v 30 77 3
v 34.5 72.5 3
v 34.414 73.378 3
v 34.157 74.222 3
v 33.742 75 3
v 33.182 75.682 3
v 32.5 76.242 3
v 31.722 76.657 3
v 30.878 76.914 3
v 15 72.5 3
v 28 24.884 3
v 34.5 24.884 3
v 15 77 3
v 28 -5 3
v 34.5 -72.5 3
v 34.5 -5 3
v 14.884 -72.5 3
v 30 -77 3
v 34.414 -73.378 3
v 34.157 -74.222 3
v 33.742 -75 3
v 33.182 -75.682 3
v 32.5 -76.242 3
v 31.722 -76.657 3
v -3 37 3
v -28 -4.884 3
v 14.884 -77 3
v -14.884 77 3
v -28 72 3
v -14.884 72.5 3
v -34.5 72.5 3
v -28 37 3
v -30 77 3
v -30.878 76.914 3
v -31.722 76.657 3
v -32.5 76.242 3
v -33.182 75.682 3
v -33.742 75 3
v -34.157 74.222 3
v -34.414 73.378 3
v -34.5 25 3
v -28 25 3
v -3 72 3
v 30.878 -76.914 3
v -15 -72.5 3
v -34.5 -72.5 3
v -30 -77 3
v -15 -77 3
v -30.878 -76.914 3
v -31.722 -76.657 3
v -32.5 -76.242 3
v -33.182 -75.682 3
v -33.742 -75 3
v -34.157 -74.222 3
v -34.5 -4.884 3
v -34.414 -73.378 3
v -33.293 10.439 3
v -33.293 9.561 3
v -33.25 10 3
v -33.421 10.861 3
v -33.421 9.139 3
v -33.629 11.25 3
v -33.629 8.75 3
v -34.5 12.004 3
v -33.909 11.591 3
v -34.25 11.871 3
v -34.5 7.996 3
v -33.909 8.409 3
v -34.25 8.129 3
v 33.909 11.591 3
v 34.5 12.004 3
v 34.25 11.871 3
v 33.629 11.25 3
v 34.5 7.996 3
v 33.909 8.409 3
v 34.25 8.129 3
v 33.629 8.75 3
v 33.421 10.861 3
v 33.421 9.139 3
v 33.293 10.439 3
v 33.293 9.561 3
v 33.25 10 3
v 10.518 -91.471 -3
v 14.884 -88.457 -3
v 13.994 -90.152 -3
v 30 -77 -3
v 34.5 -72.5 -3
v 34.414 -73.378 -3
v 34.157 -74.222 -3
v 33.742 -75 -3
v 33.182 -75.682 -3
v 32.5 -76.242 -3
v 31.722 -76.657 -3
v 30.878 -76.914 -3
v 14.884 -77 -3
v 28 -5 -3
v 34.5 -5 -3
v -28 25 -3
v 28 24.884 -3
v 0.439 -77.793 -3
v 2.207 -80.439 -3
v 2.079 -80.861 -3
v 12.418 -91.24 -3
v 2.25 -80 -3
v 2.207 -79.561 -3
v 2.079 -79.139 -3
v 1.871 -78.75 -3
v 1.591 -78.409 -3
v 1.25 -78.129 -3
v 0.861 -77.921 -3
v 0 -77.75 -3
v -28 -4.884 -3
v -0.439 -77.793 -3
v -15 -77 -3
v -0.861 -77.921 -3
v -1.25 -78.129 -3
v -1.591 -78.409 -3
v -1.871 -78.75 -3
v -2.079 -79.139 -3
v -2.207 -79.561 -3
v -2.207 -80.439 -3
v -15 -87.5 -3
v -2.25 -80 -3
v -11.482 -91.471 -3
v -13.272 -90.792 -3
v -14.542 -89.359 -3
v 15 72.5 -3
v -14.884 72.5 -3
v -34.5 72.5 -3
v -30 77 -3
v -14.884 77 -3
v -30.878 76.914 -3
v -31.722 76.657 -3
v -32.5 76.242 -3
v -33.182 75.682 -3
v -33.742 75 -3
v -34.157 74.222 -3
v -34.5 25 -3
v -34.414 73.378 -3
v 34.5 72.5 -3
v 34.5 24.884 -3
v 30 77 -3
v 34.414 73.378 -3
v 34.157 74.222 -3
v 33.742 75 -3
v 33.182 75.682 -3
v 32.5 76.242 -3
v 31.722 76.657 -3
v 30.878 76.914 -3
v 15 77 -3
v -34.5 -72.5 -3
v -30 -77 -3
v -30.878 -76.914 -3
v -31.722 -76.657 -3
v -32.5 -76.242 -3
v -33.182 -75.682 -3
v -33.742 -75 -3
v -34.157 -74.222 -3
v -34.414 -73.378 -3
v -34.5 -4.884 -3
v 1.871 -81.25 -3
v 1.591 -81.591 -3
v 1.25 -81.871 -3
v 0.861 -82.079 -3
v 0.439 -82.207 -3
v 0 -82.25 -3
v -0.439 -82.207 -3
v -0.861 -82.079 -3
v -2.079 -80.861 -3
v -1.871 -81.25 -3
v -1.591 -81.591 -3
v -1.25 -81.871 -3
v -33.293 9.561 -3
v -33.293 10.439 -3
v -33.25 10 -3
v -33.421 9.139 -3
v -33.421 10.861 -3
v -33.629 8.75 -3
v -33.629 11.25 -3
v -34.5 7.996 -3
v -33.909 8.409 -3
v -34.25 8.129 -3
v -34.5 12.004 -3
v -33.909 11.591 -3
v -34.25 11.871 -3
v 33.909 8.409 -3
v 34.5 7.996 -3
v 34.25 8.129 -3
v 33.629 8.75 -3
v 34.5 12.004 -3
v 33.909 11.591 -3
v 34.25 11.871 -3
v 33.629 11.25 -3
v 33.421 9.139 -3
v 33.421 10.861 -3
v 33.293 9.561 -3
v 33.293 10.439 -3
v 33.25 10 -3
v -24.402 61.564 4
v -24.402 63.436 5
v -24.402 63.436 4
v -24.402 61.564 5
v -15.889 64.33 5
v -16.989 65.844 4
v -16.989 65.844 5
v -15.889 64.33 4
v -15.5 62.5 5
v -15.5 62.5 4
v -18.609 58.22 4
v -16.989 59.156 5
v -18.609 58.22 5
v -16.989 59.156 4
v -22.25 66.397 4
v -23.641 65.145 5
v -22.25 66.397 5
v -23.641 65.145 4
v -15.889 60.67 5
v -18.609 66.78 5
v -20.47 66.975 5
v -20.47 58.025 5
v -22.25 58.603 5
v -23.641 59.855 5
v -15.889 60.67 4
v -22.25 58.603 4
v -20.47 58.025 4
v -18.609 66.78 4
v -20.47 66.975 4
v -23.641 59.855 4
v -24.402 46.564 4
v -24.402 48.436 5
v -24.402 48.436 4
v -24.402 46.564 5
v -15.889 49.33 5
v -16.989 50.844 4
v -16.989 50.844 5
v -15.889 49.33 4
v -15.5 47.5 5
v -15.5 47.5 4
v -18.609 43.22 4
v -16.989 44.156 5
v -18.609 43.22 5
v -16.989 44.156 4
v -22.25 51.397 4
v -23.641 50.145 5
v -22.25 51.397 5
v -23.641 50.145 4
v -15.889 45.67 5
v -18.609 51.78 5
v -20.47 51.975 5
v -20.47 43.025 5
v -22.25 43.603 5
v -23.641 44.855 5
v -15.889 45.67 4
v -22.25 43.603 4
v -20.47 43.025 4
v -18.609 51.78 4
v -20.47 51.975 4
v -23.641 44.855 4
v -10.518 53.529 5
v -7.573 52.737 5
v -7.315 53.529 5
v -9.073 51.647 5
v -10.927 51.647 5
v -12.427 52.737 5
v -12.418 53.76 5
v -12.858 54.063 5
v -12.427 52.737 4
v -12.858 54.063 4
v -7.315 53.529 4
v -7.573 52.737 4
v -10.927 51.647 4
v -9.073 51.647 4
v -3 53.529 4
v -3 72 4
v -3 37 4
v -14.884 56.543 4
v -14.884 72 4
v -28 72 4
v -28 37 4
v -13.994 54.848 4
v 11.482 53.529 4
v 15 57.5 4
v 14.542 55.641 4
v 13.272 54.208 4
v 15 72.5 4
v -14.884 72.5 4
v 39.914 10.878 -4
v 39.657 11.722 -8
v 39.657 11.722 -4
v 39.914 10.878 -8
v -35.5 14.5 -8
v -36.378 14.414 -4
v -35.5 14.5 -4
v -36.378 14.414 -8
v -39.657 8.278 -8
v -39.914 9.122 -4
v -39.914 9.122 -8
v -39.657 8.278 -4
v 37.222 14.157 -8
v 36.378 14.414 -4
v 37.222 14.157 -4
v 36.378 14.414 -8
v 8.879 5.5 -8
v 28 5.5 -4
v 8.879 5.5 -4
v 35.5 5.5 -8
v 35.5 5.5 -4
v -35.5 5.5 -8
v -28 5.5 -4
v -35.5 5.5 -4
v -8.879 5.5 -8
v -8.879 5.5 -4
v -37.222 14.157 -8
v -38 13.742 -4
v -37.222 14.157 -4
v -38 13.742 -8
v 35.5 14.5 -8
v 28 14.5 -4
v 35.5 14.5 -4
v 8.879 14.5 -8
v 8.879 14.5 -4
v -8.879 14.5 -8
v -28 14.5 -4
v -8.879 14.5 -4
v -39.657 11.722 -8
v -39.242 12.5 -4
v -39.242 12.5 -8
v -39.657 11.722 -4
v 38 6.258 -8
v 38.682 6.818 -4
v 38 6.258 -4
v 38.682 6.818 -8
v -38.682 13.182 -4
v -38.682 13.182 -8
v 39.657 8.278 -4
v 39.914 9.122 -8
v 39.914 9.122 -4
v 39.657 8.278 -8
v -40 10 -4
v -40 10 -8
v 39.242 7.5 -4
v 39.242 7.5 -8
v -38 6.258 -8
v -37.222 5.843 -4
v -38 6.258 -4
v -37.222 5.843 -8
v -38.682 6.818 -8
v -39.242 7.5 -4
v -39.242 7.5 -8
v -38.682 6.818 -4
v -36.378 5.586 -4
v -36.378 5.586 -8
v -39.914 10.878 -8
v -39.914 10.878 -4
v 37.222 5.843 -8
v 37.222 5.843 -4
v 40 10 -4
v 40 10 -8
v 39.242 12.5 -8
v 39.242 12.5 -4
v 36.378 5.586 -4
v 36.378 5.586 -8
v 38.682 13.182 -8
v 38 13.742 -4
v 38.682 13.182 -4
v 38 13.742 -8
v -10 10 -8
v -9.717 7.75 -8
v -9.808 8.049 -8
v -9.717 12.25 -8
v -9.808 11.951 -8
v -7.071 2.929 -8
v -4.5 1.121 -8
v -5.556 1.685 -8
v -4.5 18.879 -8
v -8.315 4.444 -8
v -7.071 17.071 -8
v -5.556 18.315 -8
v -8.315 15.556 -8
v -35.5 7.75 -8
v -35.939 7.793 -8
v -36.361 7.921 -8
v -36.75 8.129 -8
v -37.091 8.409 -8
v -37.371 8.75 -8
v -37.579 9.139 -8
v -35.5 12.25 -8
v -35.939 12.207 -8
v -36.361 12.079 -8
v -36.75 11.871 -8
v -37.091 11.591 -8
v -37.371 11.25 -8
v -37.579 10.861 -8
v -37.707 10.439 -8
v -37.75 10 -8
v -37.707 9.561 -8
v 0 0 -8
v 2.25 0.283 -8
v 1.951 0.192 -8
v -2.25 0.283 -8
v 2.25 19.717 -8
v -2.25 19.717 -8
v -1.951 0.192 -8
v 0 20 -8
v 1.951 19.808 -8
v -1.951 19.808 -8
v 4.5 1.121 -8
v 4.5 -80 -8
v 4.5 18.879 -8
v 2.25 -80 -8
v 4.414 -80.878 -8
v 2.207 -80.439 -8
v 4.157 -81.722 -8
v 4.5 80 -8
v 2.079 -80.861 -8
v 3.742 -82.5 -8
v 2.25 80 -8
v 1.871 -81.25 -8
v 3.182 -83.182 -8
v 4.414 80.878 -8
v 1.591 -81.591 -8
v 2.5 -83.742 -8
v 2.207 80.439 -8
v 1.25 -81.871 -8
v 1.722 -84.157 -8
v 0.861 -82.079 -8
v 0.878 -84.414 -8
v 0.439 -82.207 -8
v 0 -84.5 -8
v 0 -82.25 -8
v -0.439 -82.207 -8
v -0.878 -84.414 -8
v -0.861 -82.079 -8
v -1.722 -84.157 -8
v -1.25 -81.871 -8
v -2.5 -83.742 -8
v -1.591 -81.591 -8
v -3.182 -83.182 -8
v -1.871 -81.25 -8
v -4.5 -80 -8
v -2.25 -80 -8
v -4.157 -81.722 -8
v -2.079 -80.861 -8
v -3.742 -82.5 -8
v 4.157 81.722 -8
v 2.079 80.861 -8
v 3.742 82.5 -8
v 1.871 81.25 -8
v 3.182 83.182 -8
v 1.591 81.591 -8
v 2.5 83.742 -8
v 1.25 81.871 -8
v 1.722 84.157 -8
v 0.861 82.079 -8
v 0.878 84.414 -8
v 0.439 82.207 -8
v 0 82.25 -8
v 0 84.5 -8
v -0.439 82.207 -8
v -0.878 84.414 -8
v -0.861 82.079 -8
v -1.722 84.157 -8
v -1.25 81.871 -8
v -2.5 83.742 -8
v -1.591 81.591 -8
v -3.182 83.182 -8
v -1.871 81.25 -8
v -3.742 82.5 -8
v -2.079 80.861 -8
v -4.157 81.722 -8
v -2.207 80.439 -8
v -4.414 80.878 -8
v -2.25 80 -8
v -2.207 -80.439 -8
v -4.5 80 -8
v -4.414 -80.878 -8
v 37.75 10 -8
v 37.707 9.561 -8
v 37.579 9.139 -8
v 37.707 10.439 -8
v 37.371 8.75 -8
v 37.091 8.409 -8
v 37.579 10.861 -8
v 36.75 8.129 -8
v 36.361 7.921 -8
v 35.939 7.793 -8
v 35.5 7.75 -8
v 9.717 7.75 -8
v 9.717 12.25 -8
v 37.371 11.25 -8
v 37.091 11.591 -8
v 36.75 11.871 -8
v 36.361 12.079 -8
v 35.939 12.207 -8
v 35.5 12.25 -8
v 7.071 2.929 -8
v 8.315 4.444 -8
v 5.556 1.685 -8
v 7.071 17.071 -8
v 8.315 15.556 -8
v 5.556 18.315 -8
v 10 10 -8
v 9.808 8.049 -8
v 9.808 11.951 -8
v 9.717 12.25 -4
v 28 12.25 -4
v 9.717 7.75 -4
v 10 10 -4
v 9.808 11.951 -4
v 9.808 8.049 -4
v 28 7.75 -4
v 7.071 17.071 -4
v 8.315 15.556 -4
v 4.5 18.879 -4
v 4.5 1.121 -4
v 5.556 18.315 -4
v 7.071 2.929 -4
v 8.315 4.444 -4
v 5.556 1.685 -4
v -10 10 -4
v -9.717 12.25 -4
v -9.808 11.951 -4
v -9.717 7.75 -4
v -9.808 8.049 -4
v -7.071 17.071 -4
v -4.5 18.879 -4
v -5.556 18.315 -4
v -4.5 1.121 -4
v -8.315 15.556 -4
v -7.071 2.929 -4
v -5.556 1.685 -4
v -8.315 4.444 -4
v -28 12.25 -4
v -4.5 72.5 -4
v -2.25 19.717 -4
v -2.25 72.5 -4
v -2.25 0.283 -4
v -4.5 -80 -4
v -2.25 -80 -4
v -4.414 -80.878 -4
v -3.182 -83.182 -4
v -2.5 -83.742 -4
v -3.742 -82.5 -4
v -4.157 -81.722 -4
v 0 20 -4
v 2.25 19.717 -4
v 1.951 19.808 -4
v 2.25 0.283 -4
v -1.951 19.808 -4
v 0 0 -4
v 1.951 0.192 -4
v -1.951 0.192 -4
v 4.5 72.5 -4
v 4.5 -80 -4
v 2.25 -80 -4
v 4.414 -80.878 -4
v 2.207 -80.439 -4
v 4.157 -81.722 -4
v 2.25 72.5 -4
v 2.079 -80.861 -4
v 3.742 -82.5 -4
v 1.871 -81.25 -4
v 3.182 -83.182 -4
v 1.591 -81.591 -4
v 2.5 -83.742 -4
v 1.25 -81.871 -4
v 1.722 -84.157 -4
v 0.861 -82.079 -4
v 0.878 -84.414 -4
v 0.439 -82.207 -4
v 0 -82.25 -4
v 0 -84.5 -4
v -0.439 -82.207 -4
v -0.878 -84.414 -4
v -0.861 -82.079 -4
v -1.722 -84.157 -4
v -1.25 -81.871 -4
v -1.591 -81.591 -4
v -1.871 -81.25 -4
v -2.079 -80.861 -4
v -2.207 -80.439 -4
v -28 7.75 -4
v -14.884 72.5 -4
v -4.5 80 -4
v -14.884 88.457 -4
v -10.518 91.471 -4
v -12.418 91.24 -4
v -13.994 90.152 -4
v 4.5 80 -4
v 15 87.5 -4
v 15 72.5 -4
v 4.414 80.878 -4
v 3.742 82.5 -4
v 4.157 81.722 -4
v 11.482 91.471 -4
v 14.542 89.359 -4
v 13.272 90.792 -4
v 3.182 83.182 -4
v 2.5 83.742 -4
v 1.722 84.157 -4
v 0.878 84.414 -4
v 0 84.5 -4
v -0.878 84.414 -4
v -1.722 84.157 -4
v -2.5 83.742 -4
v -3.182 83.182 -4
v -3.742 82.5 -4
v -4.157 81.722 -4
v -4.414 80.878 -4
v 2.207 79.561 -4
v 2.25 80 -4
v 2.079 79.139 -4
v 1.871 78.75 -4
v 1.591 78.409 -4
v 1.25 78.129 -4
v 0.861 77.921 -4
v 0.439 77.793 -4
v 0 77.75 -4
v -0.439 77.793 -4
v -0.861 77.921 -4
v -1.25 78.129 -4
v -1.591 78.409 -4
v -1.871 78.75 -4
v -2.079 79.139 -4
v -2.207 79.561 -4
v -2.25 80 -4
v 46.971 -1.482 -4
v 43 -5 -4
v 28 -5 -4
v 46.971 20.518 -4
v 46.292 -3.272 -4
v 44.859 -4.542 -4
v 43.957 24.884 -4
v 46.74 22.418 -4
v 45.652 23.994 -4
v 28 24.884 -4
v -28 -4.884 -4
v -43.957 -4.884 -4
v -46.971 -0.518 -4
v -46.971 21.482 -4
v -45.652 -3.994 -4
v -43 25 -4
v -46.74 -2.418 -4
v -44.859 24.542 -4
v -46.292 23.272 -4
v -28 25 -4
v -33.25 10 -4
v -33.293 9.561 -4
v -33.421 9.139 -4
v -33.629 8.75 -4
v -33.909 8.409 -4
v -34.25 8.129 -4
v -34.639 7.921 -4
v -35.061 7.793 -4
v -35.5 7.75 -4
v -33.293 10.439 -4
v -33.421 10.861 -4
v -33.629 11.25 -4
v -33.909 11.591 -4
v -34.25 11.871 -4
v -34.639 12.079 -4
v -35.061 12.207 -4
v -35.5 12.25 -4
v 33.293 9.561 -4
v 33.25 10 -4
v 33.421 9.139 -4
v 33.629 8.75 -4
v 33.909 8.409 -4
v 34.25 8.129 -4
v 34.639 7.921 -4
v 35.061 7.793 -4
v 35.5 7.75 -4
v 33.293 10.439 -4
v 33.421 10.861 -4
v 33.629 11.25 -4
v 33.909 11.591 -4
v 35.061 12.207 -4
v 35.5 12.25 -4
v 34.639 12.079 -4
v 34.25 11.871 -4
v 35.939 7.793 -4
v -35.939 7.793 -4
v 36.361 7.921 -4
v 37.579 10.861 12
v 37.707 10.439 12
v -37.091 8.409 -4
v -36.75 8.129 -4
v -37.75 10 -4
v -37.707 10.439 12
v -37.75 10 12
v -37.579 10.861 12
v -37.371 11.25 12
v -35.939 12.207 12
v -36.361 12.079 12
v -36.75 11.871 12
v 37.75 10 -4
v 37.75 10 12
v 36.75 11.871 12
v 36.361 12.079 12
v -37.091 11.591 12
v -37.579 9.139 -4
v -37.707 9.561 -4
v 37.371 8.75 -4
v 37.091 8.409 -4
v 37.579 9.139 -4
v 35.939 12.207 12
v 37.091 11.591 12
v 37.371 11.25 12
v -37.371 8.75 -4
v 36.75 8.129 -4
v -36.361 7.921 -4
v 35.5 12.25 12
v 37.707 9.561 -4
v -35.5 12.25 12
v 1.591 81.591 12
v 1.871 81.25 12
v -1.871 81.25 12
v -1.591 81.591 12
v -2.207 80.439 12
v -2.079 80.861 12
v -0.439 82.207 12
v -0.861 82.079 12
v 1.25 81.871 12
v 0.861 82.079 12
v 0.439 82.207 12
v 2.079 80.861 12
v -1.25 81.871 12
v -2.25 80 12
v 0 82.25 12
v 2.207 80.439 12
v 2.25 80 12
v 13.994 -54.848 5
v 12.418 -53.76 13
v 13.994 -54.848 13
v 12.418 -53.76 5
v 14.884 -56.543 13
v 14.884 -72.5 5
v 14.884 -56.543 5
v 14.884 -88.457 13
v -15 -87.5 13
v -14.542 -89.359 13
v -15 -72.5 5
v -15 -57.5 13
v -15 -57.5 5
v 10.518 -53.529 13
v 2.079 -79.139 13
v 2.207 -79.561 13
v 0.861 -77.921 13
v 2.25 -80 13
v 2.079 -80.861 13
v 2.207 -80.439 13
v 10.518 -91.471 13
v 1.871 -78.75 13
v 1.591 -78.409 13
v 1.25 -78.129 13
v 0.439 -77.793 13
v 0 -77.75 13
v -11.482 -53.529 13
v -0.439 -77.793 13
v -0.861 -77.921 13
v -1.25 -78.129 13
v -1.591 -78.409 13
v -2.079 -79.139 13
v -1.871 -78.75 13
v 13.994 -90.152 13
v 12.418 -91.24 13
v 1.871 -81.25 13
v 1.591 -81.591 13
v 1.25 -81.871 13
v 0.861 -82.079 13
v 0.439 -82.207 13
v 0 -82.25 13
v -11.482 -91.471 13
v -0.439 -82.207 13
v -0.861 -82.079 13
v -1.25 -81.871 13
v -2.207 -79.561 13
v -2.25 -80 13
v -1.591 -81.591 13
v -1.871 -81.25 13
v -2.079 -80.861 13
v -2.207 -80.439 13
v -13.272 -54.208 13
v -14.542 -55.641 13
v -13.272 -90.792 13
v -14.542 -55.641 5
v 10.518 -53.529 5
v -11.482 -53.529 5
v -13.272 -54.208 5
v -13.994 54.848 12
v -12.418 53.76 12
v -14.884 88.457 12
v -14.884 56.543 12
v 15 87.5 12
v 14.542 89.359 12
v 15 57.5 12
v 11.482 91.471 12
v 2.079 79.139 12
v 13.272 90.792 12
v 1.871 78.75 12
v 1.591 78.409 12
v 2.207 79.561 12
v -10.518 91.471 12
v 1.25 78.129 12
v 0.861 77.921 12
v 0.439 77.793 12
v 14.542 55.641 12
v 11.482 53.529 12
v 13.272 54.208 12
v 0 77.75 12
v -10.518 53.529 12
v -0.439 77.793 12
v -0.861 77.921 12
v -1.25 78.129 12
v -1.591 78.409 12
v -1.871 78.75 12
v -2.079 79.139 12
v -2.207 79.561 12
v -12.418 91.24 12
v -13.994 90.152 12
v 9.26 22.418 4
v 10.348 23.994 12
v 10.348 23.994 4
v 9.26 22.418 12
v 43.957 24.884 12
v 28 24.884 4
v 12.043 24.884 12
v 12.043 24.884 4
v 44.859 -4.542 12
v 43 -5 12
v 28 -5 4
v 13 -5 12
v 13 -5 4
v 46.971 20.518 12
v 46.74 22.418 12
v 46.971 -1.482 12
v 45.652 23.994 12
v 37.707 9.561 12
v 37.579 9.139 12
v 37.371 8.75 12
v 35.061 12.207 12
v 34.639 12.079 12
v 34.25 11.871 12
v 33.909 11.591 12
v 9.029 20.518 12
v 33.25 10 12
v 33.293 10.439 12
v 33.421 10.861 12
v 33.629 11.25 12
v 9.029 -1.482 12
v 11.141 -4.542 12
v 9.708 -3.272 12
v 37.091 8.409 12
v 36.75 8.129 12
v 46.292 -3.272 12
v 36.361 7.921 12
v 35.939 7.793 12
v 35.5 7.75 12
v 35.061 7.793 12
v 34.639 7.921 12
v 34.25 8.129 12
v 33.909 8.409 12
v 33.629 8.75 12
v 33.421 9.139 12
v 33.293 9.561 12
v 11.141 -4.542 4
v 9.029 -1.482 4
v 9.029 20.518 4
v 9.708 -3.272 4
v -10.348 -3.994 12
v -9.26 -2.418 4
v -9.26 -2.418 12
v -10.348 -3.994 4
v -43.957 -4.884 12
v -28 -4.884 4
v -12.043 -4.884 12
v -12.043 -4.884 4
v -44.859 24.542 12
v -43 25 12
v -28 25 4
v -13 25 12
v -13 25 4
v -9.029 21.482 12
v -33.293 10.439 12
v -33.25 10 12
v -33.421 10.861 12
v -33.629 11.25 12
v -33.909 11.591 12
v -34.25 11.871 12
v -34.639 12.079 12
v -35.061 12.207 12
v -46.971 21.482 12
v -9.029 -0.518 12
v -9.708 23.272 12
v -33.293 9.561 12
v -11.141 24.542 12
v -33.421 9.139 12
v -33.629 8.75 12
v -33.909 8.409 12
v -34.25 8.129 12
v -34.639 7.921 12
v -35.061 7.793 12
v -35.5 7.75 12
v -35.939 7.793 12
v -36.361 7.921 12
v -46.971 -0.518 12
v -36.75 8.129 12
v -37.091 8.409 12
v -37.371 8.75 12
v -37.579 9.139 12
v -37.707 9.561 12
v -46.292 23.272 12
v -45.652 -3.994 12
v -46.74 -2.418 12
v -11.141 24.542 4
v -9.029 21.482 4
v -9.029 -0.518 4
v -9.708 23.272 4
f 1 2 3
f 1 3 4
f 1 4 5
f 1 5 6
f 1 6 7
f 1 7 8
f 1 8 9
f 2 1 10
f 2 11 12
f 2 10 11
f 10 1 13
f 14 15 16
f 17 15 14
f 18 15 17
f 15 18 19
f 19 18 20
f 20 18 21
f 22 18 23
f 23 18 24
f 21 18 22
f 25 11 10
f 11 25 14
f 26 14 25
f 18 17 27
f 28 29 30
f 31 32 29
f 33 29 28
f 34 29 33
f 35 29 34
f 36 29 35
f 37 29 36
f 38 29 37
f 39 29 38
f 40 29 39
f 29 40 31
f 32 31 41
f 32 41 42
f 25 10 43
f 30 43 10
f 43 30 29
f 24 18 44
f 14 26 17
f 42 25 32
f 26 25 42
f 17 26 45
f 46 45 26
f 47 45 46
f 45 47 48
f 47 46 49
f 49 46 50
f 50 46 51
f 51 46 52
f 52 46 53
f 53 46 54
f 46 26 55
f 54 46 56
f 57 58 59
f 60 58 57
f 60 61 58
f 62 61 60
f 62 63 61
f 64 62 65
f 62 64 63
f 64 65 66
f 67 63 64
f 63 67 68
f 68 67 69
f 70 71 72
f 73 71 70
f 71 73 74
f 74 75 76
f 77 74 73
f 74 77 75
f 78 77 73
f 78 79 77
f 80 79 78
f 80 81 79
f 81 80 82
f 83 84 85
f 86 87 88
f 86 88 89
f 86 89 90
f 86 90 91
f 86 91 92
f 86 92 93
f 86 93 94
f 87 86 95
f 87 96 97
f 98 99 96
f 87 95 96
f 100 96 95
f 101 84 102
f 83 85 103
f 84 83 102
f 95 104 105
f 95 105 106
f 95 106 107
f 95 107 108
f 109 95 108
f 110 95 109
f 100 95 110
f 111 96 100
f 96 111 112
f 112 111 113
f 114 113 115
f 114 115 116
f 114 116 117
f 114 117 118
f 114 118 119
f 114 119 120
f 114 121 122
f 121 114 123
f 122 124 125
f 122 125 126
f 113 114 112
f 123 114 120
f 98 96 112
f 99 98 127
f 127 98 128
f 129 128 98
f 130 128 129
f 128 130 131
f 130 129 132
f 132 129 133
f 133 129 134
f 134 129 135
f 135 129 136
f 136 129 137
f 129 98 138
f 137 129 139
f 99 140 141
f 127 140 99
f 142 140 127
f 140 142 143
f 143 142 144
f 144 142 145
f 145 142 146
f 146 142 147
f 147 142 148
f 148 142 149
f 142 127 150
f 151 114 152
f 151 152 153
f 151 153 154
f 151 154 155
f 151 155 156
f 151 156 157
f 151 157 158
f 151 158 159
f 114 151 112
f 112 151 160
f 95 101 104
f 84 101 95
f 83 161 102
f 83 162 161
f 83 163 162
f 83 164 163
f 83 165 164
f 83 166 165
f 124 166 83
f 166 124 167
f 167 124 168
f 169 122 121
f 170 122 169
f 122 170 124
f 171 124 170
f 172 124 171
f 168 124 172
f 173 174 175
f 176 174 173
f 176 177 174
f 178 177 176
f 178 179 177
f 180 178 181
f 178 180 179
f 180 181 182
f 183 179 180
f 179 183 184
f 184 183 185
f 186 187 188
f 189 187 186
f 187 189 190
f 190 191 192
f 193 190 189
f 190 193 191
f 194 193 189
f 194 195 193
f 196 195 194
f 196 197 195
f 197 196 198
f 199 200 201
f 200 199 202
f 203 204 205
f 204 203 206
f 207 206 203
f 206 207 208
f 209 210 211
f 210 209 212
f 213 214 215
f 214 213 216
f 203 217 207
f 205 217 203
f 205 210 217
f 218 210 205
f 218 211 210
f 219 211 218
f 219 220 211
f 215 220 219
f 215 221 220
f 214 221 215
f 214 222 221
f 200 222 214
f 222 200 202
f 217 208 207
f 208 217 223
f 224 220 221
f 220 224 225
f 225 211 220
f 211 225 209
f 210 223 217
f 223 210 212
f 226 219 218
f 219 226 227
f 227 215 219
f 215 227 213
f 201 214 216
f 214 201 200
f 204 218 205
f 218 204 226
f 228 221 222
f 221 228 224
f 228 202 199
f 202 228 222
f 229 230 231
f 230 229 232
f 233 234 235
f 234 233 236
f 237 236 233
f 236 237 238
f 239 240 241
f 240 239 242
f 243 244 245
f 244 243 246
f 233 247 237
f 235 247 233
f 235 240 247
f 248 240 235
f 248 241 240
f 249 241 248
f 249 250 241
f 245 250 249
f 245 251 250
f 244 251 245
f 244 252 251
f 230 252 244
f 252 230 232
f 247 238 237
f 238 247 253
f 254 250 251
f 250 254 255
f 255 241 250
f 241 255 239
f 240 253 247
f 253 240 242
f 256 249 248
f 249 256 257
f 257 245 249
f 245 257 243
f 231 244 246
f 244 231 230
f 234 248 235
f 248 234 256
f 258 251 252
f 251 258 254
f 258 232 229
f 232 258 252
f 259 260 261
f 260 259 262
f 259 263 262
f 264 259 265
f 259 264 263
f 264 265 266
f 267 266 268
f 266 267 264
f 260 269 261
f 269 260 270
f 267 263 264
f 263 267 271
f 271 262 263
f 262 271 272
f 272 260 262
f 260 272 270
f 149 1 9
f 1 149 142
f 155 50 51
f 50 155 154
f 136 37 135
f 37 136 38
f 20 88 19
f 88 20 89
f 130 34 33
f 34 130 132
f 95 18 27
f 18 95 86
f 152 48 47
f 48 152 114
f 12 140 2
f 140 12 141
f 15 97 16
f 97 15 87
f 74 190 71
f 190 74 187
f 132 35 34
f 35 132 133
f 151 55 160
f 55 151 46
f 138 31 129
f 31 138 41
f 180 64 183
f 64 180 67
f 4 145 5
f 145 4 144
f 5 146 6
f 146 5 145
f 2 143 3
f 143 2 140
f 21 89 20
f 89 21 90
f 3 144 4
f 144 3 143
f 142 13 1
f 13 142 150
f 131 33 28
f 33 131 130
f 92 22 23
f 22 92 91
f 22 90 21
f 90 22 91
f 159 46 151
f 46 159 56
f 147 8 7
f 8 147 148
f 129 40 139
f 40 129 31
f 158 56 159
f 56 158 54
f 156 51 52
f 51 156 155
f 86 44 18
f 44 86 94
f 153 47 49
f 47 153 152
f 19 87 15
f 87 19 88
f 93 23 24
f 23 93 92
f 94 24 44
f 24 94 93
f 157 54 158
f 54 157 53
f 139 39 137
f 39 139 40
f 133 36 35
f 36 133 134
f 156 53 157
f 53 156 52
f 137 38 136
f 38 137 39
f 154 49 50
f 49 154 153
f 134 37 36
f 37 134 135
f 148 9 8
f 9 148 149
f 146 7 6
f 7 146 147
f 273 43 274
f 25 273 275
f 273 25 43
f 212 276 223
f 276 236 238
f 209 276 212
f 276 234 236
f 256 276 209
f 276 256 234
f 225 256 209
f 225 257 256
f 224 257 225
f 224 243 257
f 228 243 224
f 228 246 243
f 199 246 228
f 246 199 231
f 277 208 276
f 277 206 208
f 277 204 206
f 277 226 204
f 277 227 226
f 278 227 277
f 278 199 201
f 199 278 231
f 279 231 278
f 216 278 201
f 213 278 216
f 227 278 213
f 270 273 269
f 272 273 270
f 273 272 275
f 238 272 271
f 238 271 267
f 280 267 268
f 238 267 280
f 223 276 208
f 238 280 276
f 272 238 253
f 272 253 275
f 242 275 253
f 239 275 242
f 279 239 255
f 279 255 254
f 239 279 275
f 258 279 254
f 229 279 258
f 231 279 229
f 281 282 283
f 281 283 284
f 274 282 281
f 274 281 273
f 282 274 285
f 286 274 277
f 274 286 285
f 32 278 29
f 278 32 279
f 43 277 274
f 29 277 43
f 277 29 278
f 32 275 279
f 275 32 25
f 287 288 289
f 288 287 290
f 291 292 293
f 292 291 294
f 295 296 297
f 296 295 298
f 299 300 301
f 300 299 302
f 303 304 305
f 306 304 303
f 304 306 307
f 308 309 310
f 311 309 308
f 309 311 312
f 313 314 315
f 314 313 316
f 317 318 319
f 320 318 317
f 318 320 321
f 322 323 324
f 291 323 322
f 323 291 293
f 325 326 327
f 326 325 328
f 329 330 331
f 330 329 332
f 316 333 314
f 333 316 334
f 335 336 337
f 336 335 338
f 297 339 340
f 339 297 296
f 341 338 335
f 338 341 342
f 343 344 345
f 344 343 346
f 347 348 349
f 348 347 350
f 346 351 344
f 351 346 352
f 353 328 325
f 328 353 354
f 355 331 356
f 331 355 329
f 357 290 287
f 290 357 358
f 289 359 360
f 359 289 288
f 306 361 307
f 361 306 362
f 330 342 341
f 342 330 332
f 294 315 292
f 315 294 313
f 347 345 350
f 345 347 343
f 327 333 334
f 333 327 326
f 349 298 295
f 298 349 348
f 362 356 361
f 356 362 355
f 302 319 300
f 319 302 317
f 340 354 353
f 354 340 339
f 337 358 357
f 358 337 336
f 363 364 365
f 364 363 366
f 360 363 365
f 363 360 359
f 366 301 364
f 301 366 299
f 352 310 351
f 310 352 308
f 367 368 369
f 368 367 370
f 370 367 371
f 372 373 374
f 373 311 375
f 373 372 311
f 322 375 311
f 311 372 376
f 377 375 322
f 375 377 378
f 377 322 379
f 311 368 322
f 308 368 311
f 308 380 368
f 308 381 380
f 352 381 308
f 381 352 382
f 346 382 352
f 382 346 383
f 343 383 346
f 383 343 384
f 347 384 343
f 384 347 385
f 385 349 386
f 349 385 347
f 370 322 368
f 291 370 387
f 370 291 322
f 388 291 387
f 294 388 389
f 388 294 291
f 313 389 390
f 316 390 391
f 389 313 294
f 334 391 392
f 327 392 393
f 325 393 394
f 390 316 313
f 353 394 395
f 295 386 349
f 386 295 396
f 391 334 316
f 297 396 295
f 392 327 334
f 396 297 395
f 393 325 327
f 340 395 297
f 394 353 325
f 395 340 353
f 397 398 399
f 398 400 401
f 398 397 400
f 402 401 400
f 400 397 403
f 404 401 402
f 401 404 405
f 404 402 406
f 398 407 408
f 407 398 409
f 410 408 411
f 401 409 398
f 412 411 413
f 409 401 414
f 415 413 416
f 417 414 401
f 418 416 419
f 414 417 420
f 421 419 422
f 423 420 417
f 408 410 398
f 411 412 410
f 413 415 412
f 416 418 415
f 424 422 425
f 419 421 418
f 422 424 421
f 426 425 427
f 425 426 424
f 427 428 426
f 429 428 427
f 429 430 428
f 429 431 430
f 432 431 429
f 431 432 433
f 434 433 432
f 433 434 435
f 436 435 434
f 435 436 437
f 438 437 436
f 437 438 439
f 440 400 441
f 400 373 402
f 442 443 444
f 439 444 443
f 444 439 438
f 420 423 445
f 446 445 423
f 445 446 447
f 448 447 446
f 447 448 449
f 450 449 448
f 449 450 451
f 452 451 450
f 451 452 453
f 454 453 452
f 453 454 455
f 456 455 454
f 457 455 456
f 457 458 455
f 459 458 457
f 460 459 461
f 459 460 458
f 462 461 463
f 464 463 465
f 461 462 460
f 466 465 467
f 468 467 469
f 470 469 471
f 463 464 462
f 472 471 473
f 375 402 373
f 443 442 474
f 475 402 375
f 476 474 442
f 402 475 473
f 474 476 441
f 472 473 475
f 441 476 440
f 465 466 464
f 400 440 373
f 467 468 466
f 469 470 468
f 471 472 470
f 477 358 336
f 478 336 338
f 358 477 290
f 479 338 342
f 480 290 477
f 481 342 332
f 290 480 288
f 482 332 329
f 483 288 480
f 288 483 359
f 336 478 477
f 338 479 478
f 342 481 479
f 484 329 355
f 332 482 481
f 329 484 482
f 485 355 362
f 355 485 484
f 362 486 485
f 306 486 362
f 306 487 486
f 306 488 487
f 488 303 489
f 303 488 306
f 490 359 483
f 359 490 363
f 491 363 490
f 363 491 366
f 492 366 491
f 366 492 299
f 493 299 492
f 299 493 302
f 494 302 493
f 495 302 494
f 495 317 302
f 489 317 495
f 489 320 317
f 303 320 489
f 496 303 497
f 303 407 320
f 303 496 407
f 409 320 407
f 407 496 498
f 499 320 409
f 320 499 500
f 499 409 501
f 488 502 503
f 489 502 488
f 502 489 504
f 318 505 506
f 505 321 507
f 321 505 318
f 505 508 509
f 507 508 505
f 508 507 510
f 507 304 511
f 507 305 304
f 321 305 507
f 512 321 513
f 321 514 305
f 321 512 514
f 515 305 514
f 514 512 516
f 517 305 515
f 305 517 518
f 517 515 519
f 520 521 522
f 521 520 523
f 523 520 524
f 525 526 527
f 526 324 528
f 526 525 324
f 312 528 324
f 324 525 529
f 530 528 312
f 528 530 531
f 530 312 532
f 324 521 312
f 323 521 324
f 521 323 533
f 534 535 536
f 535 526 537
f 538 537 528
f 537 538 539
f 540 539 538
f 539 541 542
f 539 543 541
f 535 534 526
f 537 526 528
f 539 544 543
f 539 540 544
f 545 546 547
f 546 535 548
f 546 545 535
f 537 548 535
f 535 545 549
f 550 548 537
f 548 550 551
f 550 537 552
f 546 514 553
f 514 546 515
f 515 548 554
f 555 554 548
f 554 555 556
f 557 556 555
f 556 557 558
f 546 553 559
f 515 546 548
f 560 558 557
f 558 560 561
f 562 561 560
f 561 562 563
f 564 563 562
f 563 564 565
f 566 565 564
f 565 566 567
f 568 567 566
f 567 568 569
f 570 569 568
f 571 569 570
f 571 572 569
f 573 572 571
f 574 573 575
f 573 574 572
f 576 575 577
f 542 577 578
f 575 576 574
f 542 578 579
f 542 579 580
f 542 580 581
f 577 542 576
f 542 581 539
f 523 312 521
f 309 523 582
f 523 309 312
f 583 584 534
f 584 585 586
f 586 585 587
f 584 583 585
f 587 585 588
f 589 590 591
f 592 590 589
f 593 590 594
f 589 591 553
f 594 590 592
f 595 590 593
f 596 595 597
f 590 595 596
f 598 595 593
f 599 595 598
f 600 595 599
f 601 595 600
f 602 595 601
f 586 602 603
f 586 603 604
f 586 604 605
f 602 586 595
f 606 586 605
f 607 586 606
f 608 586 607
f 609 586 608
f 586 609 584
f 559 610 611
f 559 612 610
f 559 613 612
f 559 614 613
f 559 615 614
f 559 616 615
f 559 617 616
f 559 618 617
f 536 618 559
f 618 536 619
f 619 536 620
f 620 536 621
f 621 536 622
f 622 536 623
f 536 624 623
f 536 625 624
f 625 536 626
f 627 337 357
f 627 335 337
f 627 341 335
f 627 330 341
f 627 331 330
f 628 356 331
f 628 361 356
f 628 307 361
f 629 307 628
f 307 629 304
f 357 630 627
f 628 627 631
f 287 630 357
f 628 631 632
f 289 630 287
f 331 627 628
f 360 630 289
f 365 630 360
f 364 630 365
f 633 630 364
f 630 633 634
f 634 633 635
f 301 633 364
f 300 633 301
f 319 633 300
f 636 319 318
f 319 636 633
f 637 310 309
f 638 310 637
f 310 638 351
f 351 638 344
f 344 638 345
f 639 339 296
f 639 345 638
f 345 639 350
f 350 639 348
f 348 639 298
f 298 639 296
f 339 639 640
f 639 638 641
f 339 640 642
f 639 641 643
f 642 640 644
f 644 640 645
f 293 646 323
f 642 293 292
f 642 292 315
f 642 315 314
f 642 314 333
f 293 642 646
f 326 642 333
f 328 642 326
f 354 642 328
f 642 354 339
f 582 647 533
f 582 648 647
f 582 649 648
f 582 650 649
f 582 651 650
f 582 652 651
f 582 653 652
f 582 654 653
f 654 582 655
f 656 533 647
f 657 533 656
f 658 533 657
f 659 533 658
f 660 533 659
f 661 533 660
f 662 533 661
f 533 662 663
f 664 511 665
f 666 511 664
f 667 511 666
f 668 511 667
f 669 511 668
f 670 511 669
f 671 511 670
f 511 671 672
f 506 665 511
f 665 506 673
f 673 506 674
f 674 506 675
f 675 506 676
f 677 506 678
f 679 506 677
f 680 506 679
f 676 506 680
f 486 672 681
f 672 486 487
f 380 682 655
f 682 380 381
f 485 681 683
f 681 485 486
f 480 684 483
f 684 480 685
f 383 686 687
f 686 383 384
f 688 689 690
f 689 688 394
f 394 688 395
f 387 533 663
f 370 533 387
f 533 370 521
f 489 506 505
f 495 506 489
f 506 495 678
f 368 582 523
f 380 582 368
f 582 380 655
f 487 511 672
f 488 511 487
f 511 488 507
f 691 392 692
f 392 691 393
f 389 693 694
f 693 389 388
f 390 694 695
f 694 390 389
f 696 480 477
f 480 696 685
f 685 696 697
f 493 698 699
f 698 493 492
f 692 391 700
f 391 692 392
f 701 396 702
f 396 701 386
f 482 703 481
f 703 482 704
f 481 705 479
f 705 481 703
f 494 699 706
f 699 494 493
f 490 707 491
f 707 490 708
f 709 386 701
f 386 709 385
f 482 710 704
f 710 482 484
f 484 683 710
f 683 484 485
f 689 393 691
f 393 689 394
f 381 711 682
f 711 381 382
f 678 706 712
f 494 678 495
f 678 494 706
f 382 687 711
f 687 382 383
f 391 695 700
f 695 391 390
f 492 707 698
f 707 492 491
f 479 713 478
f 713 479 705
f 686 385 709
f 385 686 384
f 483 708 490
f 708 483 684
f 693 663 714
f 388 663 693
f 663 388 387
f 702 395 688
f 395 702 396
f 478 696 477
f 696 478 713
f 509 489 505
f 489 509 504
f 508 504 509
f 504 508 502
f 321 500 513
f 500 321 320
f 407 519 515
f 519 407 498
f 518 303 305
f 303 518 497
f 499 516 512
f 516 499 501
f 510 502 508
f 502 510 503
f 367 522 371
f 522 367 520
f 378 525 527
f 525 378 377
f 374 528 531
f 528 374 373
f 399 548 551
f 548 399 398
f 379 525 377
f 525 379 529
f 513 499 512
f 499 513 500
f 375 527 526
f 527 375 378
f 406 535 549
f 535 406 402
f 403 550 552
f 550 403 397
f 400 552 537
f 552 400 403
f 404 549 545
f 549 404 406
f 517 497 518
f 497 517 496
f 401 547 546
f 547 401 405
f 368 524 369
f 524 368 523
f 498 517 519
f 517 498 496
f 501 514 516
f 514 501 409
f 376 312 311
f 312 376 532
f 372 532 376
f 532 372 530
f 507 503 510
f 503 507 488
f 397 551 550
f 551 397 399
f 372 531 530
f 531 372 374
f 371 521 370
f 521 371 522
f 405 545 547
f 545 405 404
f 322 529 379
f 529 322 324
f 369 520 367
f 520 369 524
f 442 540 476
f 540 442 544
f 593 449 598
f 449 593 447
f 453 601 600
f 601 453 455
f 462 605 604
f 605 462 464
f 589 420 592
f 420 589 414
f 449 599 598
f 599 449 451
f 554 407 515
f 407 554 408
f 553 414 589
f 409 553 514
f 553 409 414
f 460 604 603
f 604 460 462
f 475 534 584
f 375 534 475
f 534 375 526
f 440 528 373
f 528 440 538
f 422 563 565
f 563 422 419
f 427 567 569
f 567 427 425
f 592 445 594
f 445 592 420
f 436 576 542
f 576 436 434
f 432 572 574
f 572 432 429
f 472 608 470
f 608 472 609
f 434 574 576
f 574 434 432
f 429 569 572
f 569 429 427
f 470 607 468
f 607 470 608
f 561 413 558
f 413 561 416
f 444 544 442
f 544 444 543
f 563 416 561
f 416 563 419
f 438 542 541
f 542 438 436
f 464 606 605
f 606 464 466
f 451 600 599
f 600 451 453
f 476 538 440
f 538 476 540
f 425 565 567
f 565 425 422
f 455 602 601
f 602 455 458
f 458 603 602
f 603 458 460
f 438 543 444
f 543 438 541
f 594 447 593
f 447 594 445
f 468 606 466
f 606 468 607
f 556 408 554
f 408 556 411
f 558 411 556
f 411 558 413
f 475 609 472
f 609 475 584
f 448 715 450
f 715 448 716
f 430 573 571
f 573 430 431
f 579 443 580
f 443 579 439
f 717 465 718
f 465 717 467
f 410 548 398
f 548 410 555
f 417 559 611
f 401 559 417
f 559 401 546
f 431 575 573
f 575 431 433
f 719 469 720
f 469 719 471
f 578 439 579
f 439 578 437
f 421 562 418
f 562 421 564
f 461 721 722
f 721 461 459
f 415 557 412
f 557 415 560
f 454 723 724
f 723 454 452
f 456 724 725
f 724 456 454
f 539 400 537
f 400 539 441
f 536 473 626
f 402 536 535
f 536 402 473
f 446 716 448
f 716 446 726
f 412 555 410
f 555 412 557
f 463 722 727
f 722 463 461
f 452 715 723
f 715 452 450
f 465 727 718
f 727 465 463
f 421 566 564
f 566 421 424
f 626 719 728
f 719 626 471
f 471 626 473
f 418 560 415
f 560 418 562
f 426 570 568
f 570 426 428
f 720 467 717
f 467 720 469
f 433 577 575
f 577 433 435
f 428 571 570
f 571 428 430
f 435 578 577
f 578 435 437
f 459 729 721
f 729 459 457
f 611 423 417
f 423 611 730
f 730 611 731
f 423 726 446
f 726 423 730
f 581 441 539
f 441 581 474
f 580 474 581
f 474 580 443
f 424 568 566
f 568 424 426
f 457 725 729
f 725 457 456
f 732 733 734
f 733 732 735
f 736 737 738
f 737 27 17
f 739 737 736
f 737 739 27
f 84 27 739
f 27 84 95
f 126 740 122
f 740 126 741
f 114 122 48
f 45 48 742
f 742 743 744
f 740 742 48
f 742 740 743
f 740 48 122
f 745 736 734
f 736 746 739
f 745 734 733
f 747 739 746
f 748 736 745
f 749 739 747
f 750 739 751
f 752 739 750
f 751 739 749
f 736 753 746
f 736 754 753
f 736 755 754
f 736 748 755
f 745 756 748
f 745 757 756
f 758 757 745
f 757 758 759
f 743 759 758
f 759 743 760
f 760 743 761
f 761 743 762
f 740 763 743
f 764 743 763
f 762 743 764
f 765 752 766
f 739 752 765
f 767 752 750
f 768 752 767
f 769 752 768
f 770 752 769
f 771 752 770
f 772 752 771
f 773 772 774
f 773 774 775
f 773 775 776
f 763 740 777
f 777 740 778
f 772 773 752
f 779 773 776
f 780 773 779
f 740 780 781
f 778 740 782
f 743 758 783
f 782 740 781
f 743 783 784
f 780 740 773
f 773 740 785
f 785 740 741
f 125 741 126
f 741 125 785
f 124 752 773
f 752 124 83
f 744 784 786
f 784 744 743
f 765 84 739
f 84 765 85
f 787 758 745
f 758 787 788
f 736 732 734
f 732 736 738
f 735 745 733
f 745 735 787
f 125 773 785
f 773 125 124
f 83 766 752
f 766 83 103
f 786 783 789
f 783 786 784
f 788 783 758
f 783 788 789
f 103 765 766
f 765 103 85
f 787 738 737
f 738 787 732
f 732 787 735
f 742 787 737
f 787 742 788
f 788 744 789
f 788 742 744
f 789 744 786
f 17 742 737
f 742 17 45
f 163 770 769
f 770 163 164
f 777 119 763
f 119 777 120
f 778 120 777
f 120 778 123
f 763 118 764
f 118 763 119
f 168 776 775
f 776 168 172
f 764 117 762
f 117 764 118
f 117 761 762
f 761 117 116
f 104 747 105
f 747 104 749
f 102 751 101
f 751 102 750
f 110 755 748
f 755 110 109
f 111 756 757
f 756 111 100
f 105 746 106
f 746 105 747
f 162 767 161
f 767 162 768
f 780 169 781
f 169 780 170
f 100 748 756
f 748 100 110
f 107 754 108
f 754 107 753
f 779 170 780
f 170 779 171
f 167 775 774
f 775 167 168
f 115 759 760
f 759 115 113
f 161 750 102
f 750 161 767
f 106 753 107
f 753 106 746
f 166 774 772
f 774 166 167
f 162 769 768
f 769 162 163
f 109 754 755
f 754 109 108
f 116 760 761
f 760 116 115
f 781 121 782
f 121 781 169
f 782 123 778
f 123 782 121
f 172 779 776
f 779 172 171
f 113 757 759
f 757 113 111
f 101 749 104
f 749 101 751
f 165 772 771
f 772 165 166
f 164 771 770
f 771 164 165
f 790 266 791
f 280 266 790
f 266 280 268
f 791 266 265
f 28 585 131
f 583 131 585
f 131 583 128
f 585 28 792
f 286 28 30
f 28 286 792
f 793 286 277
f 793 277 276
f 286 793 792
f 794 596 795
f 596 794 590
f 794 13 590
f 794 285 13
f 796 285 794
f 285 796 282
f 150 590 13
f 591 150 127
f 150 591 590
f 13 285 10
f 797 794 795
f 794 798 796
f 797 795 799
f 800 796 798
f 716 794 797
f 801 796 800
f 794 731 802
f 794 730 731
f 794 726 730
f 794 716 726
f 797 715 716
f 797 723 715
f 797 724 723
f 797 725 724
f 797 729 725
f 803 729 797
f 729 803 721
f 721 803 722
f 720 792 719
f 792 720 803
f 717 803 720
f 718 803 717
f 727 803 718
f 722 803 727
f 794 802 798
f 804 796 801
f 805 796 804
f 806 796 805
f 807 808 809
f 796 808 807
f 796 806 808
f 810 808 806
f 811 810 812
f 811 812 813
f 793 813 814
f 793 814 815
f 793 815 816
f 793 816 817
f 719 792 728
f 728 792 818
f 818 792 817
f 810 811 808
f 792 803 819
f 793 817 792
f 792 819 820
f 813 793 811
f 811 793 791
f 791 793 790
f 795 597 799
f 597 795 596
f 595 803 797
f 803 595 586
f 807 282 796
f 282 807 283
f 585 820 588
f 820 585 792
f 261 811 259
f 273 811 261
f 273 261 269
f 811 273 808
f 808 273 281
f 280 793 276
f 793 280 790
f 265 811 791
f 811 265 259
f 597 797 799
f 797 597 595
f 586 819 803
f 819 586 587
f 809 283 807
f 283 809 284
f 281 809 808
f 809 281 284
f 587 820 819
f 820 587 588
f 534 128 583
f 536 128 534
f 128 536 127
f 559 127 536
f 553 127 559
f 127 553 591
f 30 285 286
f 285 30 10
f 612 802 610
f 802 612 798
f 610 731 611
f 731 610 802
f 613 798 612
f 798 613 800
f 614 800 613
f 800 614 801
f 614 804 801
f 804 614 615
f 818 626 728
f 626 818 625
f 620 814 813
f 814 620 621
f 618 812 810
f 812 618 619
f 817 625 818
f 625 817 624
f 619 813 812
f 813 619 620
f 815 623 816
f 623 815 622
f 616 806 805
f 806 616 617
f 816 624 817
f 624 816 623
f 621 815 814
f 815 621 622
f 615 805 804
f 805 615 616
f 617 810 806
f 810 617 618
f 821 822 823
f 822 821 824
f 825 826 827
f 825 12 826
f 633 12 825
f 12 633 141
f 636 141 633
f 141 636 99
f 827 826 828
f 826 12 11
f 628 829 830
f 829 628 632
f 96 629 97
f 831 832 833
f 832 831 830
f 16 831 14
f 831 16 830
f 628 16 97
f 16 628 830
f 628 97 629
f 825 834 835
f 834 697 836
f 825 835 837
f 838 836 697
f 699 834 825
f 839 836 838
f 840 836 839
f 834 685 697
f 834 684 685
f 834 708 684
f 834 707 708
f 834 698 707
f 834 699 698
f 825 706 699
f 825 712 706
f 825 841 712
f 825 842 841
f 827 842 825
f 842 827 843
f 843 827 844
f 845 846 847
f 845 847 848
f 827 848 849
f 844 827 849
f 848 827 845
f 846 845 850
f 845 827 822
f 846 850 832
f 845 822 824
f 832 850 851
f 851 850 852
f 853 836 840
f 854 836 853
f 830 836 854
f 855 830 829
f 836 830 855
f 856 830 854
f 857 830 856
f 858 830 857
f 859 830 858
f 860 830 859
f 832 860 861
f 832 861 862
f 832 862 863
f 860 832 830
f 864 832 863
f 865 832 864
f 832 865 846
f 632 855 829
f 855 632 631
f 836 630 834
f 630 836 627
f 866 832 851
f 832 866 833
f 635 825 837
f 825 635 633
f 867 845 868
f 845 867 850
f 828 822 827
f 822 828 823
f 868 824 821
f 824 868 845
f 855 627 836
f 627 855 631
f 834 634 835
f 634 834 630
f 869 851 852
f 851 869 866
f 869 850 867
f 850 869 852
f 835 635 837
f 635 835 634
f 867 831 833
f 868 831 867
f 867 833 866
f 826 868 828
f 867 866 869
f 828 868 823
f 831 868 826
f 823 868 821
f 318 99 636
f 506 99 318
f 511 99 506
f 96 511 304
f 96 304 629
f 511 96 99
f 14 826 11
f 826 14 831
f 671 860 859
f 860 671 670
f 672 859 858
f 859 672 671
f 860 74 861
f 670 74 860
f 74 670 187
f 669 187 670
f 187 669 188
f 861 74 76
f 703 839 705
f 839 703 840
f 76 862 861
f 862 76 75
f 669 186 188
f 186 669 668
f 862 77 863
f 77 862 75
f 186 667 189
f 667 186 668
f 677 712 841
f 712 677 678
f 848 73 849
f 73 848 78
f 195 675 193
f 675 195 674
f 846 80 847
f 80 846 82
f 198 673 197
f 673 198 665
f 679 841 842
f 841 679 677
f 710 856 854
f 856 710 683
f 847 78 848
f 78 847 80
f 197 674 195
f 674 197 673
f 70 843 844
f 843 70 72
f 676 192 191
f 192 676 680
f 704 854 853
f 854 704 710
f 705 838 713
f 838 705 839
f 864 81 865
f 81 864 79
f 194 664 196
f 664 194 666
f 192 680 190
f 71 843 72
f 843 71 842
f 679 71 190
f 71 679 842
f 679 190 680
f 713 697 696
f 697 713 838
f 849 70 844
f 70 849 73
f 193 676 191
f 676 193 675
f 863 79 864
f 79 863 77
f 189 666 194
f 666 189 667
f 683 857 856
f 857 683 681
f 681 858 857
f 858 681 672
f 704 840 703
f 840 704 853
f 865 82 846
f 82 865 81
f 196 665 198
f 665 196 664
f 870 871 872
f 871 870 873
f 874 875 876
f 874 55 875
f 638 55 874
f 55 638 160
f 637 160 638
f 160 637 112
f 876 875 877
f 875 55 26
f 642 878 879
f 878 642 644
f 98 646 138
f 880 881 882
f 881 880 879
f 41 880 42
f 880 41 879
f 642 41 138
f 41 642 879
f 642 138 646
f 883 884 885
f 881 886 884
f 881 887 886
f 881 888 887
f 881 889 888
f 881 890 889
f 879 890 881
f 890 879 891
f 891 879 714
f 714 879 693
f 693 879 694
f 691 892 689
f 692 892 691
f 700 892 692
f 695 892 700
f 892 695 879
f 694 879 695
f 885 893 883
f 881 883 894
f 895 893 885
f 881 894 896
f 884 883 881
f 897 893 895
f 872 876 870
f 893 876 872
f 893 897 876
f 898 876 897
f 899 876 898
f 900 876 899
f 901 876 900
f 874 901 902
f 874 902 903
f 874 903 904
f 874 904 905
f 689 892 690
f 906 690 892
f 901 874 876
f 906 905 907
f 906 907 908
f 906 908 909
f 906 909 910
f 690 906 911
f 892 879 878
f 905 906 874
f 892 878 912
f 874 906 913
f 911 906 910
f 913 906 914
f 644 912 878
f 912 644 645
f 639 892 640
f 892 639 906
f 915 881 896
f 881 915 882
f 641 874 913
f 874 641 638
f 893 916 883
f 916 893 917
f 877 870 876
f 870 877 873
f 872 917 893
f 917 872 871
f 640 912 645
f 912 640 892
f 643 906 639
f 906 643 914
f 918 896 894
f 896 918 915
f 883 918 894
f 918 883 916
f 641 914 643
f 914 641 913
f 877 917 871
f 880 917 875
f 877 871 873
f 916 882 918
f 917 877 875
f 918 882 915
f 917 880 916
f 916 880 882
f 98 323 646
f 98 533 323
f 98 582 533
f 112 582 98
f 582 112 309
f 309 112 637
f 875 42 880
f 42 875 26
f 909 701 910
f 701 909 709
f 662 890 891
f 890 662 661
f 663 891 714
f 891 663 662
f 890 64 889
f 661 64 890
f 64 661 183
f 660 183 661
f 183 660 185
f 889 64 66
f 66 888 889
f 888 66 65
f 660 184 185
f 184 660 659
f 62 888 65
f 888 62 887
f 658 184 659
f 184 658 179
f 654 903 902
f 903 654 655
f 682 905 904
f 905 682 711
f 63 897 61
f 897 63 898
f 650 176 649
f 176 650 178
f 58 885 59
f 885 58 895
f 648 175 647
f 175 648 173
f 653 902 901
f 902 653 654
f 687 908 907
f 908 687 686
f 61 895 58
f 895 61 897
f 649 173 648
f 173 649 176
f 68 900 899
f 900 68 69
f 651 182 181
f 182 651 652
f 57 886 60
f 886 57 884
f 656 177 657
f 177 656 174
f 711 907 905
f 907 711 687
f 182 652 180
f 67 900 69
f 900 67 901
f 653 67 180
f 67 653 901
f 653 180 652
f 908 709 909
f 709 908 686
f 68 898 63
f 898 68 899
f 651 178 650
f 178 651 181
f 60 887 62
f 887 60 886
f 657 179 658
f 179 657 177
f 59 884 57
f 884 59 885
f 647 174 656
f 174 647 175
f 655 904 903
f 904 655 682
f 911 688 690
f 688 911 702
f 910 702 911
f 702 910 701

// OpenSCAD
// file: holder.scad
len_phone = 145;
d_screw_m4 = 4.5;
width_phone = 56;
thikness_holder = 4;
thikness_phone = 8;
append = 15;
corner_round = 8;
w_grip = 30;

//holder_set();
//vertical_block(len_phone);

test_print_holder();

module test_print_holder() {
    translate([0, -24, 6])
    grip();
    horizontal_block(len_block=width_phone, offset_vertical=10);
}


module grip() {
    difference() {
        grip_base();
        
        color("red")
        translate([0, w_grip/2, thikness_phone])
        cube([w_grip+1, w_grip, 2*thikness_phone], center=true);
        
        translate([0, -w_grip/4, 0])
        cylinder(d=d_screw_m4, 3*thikness_phone, center=true, $fn=32);
    }
}


module grip_base() {
    hull() {
        translate([w_grip/2-corner_round/2, -w_grip/2, 0])
        cylinder(d=corner_round, 2*thikness_phone, center=true);
        
        translate([-w_grip/2+corner_round/2, -w_grip/2, 0])
        cylinder(d=corner_round, 2*thikness_phone, center=true);
        
        translate([w_grip/2-corner_round/2, w_grip/2, 0])
        cylinder(d=corner_round, 2*thikness_phone, center=true);
        
        translate([-w_grip/2+corner_round/2, w_grip/2, 0])
        cylinder(d=corner_round, 2*thikness_phone, center=true);
    }
}


module horizontal_block(len_block, offset_vertical) {
    len_block = len_block + append;
    
    translate([0, offset_vertical, 0])
    cylinder(d=20, h=thikness_holder, center=true, $fn=32);
    
    difference() {
        hull() {
            translate([len_block/2, offset_vertical, 0])
            cylinder(d=9, h=thikness_holder, center=true, $fn=32);
            
            translate([-len_block/2, offset_vertical, 0])
            cylinder(d=9, h=thikness_holder, center=true, $fn=32);
        }
        color("red")
        hull() {
            translate([len_block/2, offset_vertical, 0])
            cylinder(d=d_screw_m4, h=thikness_holder+2, center=true, $fn=32);
            
            translate([-len_block/2, offset_vertical, 0])
            cylinder(d=d_screw_m4, h=thikness_holder+2, center=true, $fn=32);
        }
    }
}


module vertical_block(len_block) {
    len_block = len_block + append;
    
        difference() {
            hull() {
                //translate([0, -len_phone/2, 0])
                translate([0, -len_block/2, 0])
                cylinder(d=9, h=thikness_holder, center=true, $fn=32);
                
                //translate([0, -len_phone/2, 0])
                translate([0, len_block/2, 0])
                cylinder(d=9, h=thikness_holder, center=true, $fn=32);
            }
            color("red")
            hull() {
                //translate([0, -len_phone/2, 0])
                translate([0, -len_block/2, 0])
                cylinder(d=d_screw_m4, h=thikness_holder+2, center=true, $fn=32);
                
                //translate([0, -len_phone/2, 0])
                translate([0, len_block/2, 0])
                cylinder(d=d_screw_m4, h=thikness_holder+2, center=true, $fn=32);
        }
    }
}


module holder_set() {
    holder_base();
    
    translate([0, -len_phone/2, thikness_phone+thikness_holder/2+1])
    rotate([0, 180, 0])
    grip();
    
    translate([0, len_phone/2, thikness_phone+thikness_holder/2])
    rotate([0, 180, 180])
    grip();
    
    translate([width_phone/2, 10, thikness_phone+thikness_holder/2])
    rotate([0, 180, 90])
    grip();
    
    translate([-width_phone/2, 10, thikness_phone+thikness_holder/2])
    rotate([0, 180, -90])
    grip();
}


module holder_base() {
    horizontal_block(len_block=width_phone, offset_vertical=10);
    vertical_block(len_block=len_phone);
}
// file: smartphone.scad
echo("Работа Сергея Владыкина");
len_phone = 145;
width_phone = 60;
thickness_phone = 6;

corner_round = 9;

module camera() {
    cube([width_phone, len_phone, thickness_phone], center=true);

    color("blue")
    translate([width_phone/2-50, len_phone/2-10, 0])
    cylinder(d=9, h = thickness_phone - 1);

    color("blue")
    translate([width_phone/2-50, len_phone/2-25, 0])
    cylinder(d=9, h = thickness_phone - 1);

    color("blue")
    translate([width_phone/2-40, len_phone/2-18, 0])
    cylinder(d=6, h = thickness_phone - 1);
}

module smartphone_block() {
    hull() {
        color("red")
        translate([width_phone/2, len_phone/2, 0])
        cylinder(h=thickness_phone, d=corner_round, $fn=32, center=true);

        mirror([1,0,0])
        color("red")
        translate([width_phone/2, len_phone/2, 0])
        cylinder(h=thickness_phone, d=corner_round, $fn=32, center=true);

        mirror([0,1,0])
        color("red")
        translate([width_phone/2, len_phone/2, 0])
        cylinder(h=thickness_phone, d=corner_round, $fn=32, center=true);

        mirror([1,0,0])
        mirror([0,1,0])
        color("red")
        translate([width_phone/2, len_phone/2, 0])
        cylinder(h=thickness_phone, d=corner_round, $fn=32, center=true);
    }
}

h = 3;

module smartphone() {
    smartphone_block();
    camera();
    color("red")
    translate([-28, 37, 2])
    cube([25, 35, 2]);
}

smartphone();
// main file
use <smartphone.scad>
use <holder.scad>

thickness_phone = 8;
thickness_holder = 4;

echo("Работа Сергея Владыкина");

smartphone();
translate([0, 0, -thickness_phone/2-thickness_holder/2])
holder_set();
